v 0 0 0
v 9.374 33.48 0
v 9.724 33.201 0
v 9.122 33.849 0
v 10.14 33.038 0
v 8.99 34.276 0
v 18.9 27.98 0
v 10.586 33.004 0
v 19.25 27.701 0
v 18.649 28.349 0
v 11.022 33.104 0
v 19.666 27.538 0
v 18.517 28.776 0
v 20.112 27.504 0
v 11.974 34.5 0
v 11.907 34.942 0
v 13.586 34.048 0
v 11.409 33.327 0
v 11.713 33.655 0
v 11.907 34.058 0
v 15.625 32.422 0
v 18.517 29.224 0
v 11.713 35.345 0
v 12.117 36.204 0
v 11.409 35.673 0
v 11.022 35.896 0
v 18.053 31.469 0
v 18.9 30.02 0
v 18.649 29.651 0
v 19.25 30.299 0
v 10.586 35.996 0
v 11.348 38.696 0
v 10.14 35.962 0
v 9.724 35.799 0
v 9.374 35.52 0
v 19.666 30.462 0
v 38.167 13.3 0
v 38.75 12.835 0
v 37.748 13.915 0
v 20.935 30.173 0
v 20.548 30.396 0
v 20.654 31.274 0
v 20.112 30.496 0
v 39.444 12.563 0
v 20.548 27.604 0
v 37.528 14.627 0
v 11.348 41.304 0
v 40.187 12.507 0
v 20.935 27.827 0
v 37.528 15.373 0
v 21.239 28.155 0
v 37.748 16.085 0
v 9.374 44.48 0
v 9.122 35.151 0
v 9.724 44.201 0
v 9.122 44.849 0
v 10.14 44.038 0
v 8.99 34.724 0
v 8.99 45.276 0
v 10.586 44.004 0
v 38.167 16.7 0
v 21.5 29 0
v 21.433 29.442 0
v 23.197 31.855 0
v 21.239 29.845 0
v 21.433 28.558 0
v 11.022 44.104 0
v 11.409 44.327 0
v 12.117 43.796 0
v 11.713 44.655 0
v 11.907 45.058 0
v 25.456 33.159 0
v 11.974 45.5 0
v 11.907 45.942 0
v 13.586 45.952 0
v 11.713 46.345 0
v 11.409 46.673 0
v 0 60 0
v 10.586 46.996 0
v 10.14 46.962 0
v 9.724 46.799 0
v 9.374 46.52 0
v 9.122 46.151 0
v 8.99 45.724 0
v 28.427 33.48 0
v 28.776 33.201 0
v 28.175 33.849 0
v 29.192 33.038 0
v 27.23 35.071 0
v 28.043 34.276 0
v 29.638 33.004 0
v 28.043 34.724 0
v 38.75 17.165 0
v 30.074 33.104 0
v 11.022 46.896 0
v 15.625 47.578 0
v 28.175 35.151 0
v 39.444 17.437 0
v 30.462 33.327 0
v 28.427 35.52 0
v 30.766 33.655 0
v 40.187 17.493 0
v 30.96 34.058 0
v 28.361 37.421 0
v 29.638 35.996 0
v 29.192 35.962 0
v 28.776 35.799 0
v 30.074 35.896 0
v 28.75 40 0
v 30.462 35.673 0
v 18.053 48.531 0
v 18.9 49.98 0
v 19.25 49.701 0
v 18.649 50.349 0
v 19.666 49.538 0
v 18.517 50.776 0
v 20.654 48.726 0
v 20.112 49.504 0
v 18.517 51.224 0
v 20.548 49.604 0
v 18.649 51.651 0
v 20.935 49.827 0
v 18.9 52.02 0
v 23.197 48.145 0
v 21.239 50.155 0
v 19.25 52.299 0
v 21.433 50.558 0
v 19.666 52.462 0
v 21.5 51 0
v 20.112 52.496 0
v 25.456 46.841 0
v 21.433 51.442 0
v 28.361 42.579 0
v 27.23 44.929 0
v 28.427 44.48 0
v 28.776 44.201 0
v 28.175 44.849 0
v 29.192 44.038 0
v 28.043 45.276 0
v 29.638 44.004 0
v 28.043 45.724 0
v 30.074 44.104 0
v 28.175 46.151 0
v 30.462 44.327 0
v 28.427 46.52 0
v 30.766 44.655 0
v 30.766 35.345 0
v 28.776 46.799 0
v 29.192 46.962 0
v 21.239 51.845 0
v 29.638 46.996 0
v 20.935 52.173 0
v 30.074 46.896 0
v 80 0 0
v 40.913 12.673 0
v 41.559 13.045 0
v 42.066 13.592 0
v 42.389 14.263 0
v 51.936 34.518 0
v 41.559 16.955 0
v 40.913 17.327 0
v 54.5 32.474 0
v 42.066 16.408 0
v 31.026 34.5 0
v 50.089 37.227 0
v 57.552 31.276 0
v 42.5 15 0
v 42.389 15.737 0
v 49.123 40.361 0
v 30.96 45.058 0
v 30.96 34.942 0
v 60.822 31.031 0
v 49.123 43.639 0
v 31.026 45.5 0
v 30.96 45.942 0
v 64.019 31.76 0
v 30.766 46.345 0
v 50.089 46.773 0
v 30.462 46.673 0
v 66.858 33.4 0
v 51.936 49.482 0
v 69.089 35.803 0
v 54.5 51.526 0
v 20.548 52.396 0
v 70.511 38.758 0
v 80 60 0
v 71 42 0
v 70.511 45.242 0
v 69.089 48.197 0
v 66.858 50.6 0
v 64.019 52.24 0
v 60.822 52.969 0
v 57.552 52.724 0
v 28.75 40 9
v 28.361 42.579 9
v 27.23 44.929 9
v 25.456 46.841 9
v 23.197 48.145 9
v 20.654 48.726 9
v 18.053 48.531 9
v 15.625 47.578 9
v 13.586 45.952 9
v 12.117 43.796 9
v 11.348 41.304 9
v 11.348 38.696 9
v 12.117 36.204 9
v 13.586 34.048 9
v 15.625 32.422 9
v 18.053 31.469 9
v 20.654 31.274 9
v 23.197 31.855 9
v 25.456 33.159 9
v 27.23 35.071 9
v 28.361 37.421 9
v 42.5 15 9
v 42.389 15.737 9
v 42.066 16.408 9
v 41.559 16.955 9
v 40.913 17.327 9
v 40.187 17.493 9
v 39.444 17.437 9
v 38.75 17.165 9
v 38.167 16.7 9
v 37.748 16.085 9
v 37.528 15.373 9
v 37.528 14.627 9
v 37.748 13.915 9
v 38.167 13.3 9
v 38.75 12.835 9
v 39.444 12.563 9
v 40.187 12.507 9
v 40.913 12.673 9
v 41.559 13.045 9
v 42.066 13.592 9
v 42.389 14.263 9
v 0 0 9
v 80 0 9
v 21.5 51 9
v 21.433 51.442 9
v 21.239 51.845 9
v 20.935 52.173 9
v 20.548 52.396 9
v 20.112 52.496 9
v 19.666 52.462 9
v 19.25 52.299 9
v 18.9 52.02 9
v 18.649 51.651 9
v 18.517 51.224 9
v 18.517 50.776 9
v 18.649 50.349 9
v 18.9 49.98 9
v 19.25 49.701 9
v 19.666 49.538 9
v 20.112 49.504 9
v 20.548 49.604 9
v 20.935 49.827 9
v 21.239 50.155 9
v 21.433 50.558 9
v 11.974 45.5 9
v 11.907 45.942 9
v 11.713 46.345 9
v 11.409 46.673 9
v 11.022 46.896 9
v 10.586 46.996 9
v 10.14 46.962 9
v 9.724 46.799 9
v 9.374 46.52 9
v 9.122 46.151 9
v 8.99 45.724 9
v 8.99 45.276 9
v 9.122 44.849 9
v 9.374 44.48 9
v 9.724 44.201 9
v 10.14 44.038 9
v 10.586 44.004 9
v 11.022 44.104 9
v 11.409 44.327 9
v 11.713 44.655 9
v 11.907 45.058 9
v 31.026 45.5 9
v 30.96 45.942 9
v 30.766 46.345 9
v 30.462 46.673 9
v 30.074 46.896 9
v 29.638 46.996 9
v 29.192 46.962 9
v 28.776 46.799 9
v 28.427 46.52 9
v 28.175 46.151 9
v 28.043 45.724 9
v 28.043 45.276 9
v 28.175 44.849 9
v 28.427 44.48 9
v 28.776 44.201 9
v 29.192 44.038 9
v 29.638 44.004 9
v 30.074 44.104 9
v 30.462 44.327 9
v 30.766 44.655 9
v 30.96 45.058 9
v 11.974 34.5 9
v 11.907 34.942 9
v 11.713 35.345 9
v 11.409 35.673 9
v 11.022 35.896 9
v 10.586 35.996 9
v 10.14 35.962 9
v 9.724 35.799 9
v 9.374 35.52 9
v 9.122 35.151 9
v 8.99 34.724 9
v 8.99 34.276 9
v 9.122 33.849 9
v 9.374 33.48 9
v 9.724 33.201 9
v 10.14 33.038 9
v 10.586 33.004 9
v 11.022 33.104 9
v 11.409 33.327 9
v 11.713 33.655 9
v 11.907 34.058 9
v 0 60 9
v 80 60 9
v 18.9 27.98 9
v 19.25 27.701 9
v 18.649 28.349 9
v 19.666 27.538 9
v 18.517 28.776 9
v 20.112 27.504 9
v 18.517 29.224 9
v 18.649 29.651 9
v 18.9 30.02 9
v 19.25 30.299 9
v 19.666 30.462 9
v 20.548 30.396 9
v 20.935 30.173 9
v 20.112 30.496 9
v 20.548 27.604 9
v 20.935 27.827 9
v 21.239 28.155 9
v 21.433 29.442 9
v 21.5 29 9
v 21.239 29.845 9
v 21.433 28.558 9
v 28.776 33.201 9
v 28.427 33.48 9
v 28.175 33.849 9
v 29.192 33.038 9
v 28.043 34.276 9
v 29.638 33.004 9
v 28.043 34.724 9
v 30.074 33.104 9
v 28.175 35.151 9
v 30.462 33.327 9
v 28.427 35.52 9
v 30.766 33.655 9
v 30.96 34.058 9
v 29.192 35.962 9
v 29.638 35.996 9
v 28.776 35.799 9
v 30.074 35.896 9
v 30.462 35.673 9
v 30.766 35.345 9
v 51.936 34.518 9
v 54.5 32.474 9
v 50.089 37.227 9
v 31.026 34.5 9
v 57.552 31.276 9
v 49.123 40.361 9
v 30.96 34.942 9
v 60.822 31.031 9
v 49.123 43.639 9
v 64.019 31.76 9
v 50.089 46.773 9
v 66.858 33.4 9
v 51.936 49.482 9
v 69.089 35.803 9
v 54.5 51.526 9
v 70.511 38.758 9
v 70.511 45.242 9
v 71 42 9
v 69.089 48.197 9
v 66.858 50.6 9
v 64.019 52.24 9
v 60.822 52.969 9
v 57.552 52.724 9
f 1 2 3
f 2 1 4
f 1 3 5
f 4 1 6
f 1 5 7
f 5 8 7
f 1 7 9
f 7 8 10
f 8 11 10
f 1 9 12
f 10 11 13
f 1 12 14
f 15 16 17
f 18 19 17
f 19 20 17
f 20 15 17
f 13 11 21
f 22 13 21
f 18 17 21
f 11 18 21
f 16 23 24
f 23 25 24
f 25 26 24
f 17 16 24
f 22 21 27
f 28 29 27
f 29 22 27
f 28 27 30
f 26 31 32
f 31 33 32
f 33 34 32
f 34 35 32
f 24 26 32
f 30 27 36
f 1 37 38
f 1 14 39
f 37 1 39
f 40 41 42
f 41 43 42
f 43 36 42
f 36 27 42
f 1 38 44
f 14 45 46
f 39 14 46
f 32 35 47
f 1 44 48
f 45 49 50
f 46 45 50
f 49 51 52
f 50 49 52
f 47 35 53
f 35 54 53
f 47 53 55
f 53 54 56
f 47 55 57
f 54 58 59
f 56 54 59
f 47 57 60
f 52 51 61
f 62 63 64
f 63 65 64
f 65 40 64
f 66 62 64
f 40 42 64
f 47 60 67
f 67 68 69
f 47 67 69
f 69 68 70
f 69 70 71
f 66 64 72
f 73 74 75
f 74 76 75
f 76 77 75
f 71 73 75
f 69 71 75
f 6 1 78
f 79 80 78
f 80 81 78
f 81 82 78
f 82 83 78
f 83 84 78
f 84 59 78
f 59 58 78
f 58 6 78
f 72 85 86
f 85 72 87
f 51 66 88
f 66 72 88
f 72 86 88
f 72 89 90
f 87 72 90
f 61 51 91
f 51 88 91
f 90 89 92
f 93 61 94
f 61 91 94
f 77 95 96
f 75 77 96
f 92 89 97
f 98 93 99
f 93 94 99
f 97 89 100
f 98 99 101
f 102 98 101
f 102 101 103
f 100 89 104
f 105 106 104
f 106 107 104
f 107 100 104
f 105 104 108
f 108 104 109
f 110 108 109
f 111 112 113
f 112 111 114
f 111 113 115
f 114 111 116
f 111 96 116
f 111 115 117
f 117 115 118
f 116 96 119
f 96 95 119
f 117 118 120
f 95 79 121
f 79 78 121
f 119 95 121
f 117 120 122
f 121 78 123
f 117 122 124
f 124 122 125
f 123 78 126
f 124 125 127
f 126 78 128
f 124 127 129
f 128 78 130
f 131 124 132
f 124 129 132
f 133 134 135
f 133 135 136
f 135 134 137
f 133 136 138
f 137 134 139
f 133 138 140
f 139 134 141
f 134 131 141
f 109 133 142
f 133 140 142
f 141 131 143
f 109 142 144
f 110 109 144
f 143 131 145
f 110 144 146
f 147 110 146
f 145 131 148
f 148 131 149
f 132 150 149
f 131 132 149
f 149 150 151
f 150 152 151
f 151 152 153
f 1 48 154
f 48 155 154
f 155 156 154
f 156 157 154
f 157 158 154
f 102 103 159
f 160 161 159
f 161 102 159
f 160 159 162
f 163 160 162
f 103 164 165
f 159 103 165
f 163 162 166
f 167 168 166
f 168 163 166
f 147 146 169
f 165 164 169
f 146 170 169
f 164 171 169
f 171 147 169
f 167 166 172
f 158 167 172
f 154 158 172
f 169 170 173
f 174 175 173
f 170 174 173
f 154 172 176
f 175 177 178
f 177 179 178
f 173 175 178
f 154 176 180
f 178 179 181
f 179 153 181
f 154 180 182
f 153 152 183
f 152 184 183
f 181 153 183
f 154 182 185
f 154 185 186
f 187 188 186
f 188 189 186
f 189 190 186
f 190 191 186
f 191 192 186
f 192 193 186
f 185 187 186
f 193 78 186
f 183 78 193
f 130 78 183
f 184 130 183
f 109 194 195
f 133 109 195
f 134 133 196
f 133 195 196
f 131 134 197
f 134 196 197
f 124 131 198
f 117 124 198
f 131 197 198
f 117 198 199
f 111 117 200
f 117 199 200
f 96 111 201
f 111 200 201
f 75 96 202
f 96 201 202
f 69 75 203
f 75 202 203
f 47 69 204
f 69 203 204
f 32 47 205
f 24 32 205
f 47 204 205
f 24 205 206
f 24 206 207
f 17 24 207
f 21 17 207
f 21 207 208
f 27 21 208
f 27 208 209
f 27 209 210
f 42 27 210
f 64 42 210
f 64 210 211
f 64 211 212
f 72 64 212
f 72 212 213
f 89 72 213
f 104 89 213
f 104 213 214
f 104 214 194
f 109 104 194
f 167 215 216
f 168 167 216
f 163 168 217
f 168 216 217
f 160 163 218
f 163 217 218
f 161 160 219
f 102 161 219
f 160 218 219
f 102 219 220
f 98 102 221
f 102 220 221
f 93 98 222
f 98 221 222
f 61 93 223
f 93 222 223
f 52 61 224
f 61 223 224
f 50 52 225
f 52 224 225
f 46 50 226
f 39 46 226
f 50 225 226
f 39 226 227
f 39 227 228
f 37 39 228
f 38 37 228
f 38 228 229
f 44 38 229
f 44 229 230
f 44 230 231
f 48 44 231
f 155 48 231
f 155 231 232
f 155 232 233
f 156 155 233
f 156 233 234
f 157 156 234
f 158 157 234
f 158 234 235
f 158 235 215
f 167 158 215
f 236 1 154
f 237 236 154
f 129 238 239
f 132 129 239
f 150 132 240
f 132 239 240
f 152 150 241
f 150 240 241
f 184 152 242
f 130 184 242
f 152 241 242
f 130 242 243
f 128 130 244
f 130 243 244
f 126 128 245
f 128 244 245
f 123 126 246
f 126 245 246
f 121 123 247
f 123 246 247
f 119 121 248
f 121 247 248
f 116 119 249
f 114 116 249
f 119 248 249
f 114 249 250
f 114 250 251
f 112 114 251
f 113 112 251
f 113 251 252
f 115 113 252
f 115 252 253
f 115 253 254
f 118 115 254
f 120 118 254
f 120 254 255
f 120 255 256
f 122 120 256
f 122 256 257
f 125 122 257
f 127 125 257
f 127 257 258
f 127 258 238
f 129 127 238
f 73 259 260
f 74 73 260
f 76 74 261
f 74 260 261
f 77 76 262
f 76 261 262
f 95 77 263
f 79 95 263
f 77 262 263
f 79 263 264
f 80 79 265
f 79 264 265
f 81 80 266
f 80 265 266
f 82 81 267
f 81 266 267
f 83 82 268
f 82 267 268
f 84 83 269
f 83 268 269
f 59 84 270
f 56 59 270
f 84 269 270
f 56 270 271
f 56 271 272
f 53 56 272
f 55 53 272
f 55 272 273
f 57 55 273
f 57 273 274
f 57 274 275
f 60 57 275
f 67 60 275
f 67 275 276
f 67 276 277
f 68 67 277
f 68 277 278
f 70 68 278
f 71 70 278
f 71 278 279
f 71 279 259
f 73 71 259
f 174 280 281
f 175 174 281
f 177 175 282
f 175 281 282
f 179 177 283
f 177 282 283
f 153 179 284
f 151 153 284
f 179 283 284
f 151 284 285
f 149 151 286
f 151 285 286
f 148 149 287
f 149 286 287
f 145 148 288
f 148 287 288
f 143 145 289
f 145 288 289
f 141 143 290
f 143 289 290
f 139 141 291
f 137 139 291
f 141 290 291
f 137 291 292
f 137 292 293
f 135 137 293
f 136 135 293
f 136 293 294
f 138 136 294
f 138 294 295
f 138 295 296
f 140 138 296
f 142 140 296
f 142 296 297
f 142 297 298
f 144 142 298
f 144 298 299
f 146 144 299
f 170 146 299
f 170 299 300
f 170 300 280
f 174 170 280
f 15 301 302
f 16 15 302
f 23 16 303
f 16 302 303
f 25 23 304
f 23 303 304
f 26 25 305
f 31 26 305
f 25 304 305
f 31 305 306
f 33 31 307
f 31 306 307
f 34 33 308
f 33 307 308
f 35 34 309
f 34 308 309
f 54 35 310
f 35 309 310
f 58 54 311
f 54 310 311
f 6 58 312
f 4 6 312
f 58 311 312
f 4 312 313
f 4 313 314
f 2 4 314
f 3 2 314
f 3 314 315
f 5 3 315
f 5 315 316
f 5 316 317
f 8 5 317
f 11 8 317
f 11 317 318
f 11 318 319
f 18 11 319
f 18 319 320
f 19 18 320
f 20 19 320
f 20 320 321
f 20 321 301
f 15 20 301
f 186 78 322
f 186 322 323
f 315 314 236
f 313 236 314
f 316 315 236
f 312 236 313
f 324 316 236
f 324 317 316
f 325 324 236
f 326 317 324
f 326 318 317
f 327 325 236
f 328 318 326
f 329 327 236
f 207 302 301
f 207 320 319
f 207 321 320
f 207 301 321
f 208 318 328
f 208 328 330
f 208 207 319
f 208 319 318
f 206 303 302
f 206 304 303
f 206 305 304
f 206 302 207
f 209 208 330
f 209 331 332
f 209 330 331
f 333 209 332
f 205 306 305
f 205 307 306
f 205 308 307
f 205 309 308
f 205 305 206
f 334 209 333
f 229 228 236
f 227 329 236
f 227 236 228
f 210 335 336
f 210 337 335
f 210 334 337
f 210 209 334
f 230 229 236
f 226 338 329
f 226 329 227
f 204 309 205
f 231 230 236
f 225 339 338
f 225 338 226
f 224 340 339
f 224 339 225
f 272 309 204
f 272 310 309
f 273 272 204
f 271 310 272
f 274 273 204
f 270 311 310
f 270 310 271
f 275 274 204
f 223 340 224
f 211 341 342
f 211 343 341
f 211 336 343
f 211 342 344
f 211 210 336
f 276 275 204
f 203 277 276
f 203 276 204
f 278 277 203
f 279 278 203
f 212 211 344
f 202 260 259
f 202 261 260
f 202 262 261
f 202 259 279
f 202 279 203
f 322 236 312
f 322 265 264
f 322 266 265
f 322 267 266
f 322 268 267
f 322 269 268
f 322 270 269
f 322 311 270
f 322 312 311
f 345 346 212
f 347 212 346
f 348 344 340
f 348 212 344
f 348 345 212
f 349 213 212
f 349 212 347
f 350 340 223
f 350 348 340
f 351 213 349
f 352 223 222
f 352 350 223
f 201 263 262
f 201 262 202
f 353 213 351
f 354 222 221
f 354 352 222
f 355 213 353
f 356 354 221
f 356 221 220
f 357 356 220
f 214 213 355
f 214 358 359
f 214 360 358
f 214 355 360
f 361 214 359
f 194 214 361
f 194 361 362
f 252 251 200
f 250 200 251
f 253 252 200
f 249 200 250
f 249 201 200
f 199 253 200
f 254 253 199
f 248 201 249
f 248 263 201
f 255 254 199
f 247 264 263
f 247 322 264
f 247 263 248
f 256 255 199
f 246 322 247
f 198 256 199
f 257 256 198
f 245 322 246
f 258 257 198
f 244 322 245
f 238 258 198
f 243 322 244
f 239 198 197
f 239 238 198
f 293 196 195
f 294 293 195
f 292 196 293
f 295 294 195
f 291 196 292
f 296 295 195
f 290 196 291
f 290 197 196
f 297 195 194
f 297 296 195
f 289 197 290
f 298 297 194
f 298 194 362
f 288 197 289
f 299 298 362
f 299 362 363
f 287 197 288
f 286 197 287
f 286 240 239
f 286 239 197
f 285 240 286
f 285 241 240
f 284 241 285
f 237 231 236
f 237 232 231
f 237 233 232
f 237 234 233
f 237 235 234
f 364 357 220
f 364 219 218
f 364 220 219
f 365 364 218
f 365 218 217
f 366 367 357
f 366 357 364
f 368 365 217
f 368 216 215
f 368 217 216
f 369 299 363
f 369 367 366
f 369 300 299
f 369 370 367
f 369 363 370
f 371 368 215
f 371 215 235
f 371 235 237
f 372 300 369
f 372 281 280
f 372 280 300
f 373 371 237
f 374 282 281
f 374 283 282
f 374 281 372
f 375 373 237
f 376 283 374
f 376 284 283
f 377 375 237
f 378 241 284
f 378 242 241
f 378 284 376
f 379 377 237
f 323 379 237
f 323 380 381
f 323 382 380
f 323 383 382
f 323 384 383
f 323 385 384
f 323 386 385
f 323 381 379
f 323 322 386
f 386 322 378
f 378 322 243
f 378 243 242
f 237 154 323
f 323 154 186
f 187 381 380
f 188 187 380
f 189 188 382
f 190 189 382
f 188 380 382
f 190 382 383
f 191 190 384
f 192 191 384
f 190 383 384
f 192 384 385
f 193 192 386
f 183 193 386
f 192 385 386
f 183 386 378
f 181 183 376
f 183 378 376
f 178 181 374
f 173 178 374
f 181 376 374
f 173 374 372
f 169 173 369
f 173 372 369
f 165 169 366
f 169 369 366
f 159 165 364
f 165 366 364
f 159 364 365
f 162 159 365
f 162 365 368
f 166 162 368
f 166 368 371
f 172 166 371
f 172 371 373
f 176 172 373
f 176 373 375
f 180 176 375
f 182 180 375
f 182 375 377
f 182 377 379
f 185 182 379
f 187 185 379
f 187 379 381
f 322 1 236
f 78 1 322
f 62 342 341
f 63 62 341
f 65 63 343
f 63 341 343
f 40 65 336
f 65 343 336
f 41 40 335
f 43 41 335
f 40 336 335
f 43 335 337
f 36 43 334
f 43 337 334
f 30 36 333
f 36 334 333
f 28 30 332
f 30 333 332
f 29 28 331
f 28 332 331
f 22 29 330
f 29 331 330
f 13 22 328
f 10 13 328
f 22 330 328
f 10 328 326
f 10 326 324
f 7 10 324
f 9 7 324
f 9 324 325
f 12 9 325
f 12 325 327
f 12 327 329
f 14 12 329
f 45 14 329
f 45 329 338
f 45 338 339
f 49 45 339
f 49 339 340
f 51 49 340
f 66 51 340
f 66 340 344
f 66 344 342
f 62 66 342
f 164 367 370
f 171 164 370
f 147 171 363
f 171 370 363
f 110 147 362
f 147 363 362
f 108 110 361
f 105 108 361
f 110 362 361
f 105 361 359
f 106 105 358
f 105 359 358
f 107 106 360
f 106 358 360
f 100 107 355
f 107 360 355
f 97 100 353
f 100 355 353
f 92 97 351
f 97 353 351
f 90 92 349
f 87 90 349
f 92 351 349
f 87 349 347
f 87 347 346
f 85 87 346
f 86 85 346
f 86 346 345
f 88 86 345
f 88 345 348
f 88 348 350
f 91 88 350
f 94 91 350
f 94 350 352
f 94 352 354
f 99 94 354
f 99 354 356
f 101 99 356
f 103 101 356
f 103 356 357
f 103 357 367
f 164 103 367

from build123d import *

# Parameters (mm, degrees)
ESQUISSE1_W             = 80
ESQUISSE1_H             = 60
BOSS_EXTRU_1_DEPTH      = 9
ESQUISSE2_R             = 11
ESQUISSE2_R_2           = 8.75
ESQUISSE2_R_3           = 1.5
ENL_V_MAT_EXTRU_1_DEPTH = 101.40418318
ESQUISSE3_R             = 2.5
ENL_V_MAT_EXTRU_2_DEPTH = 101.40418318


with BuildPart() as part:
    # Esquisse1 → Boss.-Extru.1 (new body)
    with BuildSketch(Plane.XY):
        with Locations((40, 30)):
            Rectangle(ESQUISSE1_W, ESQUISSE1_H)
    extrude(amount=BOSS_EXTRU_1_DEPTH)

    # Esquisse2 → Enlèv. mat.-Extru.1 (cut, through all)
    with BuildSketch(Plane.XY.offset(9)):
        with Locations((60, 42)):
            Circle(ESQUISSE2_R)
        with Locations((20, 40)):
            Circle(ESQUISSE2_R_2)
        with Locations((20, 51)):
            Circle(ESQUISSE2_R_3)
        with Locations((29.526279442, 45.5)):
            Circle(ESQUISSE2_R_3)
        with Locations((29.526279442, 34.5)):
            Circle(ESQUISSE2_R_3)
        with Locations((20, 29)):
            Circle(ESQUISSE2_R_3)
        with Locations((10.473720558, 34.5)):
            Circle(ESQUISSE2_R_3)
        with Locations((10.473720558, 45.5)):
            Circle(ESQUISSE2_R_3)
    extrude(amount=-ENL_V_MAT_EXTRU_1_DEPTH, mode=Mode.SUBTRACT)

    # Esquisse3 → Enlèv. mat.-Extru.2 (cut, through all)
    with BuildSketch(Plane.XY.offset(9)):
        with Locations((40, 15)):
            Circle(ESQUISSE3_R)
    extrude(amount=-ENL_V_MAT_EXTRU_2_DEPTH, mode=Mode.SUBTRACT)


solid = part.part
